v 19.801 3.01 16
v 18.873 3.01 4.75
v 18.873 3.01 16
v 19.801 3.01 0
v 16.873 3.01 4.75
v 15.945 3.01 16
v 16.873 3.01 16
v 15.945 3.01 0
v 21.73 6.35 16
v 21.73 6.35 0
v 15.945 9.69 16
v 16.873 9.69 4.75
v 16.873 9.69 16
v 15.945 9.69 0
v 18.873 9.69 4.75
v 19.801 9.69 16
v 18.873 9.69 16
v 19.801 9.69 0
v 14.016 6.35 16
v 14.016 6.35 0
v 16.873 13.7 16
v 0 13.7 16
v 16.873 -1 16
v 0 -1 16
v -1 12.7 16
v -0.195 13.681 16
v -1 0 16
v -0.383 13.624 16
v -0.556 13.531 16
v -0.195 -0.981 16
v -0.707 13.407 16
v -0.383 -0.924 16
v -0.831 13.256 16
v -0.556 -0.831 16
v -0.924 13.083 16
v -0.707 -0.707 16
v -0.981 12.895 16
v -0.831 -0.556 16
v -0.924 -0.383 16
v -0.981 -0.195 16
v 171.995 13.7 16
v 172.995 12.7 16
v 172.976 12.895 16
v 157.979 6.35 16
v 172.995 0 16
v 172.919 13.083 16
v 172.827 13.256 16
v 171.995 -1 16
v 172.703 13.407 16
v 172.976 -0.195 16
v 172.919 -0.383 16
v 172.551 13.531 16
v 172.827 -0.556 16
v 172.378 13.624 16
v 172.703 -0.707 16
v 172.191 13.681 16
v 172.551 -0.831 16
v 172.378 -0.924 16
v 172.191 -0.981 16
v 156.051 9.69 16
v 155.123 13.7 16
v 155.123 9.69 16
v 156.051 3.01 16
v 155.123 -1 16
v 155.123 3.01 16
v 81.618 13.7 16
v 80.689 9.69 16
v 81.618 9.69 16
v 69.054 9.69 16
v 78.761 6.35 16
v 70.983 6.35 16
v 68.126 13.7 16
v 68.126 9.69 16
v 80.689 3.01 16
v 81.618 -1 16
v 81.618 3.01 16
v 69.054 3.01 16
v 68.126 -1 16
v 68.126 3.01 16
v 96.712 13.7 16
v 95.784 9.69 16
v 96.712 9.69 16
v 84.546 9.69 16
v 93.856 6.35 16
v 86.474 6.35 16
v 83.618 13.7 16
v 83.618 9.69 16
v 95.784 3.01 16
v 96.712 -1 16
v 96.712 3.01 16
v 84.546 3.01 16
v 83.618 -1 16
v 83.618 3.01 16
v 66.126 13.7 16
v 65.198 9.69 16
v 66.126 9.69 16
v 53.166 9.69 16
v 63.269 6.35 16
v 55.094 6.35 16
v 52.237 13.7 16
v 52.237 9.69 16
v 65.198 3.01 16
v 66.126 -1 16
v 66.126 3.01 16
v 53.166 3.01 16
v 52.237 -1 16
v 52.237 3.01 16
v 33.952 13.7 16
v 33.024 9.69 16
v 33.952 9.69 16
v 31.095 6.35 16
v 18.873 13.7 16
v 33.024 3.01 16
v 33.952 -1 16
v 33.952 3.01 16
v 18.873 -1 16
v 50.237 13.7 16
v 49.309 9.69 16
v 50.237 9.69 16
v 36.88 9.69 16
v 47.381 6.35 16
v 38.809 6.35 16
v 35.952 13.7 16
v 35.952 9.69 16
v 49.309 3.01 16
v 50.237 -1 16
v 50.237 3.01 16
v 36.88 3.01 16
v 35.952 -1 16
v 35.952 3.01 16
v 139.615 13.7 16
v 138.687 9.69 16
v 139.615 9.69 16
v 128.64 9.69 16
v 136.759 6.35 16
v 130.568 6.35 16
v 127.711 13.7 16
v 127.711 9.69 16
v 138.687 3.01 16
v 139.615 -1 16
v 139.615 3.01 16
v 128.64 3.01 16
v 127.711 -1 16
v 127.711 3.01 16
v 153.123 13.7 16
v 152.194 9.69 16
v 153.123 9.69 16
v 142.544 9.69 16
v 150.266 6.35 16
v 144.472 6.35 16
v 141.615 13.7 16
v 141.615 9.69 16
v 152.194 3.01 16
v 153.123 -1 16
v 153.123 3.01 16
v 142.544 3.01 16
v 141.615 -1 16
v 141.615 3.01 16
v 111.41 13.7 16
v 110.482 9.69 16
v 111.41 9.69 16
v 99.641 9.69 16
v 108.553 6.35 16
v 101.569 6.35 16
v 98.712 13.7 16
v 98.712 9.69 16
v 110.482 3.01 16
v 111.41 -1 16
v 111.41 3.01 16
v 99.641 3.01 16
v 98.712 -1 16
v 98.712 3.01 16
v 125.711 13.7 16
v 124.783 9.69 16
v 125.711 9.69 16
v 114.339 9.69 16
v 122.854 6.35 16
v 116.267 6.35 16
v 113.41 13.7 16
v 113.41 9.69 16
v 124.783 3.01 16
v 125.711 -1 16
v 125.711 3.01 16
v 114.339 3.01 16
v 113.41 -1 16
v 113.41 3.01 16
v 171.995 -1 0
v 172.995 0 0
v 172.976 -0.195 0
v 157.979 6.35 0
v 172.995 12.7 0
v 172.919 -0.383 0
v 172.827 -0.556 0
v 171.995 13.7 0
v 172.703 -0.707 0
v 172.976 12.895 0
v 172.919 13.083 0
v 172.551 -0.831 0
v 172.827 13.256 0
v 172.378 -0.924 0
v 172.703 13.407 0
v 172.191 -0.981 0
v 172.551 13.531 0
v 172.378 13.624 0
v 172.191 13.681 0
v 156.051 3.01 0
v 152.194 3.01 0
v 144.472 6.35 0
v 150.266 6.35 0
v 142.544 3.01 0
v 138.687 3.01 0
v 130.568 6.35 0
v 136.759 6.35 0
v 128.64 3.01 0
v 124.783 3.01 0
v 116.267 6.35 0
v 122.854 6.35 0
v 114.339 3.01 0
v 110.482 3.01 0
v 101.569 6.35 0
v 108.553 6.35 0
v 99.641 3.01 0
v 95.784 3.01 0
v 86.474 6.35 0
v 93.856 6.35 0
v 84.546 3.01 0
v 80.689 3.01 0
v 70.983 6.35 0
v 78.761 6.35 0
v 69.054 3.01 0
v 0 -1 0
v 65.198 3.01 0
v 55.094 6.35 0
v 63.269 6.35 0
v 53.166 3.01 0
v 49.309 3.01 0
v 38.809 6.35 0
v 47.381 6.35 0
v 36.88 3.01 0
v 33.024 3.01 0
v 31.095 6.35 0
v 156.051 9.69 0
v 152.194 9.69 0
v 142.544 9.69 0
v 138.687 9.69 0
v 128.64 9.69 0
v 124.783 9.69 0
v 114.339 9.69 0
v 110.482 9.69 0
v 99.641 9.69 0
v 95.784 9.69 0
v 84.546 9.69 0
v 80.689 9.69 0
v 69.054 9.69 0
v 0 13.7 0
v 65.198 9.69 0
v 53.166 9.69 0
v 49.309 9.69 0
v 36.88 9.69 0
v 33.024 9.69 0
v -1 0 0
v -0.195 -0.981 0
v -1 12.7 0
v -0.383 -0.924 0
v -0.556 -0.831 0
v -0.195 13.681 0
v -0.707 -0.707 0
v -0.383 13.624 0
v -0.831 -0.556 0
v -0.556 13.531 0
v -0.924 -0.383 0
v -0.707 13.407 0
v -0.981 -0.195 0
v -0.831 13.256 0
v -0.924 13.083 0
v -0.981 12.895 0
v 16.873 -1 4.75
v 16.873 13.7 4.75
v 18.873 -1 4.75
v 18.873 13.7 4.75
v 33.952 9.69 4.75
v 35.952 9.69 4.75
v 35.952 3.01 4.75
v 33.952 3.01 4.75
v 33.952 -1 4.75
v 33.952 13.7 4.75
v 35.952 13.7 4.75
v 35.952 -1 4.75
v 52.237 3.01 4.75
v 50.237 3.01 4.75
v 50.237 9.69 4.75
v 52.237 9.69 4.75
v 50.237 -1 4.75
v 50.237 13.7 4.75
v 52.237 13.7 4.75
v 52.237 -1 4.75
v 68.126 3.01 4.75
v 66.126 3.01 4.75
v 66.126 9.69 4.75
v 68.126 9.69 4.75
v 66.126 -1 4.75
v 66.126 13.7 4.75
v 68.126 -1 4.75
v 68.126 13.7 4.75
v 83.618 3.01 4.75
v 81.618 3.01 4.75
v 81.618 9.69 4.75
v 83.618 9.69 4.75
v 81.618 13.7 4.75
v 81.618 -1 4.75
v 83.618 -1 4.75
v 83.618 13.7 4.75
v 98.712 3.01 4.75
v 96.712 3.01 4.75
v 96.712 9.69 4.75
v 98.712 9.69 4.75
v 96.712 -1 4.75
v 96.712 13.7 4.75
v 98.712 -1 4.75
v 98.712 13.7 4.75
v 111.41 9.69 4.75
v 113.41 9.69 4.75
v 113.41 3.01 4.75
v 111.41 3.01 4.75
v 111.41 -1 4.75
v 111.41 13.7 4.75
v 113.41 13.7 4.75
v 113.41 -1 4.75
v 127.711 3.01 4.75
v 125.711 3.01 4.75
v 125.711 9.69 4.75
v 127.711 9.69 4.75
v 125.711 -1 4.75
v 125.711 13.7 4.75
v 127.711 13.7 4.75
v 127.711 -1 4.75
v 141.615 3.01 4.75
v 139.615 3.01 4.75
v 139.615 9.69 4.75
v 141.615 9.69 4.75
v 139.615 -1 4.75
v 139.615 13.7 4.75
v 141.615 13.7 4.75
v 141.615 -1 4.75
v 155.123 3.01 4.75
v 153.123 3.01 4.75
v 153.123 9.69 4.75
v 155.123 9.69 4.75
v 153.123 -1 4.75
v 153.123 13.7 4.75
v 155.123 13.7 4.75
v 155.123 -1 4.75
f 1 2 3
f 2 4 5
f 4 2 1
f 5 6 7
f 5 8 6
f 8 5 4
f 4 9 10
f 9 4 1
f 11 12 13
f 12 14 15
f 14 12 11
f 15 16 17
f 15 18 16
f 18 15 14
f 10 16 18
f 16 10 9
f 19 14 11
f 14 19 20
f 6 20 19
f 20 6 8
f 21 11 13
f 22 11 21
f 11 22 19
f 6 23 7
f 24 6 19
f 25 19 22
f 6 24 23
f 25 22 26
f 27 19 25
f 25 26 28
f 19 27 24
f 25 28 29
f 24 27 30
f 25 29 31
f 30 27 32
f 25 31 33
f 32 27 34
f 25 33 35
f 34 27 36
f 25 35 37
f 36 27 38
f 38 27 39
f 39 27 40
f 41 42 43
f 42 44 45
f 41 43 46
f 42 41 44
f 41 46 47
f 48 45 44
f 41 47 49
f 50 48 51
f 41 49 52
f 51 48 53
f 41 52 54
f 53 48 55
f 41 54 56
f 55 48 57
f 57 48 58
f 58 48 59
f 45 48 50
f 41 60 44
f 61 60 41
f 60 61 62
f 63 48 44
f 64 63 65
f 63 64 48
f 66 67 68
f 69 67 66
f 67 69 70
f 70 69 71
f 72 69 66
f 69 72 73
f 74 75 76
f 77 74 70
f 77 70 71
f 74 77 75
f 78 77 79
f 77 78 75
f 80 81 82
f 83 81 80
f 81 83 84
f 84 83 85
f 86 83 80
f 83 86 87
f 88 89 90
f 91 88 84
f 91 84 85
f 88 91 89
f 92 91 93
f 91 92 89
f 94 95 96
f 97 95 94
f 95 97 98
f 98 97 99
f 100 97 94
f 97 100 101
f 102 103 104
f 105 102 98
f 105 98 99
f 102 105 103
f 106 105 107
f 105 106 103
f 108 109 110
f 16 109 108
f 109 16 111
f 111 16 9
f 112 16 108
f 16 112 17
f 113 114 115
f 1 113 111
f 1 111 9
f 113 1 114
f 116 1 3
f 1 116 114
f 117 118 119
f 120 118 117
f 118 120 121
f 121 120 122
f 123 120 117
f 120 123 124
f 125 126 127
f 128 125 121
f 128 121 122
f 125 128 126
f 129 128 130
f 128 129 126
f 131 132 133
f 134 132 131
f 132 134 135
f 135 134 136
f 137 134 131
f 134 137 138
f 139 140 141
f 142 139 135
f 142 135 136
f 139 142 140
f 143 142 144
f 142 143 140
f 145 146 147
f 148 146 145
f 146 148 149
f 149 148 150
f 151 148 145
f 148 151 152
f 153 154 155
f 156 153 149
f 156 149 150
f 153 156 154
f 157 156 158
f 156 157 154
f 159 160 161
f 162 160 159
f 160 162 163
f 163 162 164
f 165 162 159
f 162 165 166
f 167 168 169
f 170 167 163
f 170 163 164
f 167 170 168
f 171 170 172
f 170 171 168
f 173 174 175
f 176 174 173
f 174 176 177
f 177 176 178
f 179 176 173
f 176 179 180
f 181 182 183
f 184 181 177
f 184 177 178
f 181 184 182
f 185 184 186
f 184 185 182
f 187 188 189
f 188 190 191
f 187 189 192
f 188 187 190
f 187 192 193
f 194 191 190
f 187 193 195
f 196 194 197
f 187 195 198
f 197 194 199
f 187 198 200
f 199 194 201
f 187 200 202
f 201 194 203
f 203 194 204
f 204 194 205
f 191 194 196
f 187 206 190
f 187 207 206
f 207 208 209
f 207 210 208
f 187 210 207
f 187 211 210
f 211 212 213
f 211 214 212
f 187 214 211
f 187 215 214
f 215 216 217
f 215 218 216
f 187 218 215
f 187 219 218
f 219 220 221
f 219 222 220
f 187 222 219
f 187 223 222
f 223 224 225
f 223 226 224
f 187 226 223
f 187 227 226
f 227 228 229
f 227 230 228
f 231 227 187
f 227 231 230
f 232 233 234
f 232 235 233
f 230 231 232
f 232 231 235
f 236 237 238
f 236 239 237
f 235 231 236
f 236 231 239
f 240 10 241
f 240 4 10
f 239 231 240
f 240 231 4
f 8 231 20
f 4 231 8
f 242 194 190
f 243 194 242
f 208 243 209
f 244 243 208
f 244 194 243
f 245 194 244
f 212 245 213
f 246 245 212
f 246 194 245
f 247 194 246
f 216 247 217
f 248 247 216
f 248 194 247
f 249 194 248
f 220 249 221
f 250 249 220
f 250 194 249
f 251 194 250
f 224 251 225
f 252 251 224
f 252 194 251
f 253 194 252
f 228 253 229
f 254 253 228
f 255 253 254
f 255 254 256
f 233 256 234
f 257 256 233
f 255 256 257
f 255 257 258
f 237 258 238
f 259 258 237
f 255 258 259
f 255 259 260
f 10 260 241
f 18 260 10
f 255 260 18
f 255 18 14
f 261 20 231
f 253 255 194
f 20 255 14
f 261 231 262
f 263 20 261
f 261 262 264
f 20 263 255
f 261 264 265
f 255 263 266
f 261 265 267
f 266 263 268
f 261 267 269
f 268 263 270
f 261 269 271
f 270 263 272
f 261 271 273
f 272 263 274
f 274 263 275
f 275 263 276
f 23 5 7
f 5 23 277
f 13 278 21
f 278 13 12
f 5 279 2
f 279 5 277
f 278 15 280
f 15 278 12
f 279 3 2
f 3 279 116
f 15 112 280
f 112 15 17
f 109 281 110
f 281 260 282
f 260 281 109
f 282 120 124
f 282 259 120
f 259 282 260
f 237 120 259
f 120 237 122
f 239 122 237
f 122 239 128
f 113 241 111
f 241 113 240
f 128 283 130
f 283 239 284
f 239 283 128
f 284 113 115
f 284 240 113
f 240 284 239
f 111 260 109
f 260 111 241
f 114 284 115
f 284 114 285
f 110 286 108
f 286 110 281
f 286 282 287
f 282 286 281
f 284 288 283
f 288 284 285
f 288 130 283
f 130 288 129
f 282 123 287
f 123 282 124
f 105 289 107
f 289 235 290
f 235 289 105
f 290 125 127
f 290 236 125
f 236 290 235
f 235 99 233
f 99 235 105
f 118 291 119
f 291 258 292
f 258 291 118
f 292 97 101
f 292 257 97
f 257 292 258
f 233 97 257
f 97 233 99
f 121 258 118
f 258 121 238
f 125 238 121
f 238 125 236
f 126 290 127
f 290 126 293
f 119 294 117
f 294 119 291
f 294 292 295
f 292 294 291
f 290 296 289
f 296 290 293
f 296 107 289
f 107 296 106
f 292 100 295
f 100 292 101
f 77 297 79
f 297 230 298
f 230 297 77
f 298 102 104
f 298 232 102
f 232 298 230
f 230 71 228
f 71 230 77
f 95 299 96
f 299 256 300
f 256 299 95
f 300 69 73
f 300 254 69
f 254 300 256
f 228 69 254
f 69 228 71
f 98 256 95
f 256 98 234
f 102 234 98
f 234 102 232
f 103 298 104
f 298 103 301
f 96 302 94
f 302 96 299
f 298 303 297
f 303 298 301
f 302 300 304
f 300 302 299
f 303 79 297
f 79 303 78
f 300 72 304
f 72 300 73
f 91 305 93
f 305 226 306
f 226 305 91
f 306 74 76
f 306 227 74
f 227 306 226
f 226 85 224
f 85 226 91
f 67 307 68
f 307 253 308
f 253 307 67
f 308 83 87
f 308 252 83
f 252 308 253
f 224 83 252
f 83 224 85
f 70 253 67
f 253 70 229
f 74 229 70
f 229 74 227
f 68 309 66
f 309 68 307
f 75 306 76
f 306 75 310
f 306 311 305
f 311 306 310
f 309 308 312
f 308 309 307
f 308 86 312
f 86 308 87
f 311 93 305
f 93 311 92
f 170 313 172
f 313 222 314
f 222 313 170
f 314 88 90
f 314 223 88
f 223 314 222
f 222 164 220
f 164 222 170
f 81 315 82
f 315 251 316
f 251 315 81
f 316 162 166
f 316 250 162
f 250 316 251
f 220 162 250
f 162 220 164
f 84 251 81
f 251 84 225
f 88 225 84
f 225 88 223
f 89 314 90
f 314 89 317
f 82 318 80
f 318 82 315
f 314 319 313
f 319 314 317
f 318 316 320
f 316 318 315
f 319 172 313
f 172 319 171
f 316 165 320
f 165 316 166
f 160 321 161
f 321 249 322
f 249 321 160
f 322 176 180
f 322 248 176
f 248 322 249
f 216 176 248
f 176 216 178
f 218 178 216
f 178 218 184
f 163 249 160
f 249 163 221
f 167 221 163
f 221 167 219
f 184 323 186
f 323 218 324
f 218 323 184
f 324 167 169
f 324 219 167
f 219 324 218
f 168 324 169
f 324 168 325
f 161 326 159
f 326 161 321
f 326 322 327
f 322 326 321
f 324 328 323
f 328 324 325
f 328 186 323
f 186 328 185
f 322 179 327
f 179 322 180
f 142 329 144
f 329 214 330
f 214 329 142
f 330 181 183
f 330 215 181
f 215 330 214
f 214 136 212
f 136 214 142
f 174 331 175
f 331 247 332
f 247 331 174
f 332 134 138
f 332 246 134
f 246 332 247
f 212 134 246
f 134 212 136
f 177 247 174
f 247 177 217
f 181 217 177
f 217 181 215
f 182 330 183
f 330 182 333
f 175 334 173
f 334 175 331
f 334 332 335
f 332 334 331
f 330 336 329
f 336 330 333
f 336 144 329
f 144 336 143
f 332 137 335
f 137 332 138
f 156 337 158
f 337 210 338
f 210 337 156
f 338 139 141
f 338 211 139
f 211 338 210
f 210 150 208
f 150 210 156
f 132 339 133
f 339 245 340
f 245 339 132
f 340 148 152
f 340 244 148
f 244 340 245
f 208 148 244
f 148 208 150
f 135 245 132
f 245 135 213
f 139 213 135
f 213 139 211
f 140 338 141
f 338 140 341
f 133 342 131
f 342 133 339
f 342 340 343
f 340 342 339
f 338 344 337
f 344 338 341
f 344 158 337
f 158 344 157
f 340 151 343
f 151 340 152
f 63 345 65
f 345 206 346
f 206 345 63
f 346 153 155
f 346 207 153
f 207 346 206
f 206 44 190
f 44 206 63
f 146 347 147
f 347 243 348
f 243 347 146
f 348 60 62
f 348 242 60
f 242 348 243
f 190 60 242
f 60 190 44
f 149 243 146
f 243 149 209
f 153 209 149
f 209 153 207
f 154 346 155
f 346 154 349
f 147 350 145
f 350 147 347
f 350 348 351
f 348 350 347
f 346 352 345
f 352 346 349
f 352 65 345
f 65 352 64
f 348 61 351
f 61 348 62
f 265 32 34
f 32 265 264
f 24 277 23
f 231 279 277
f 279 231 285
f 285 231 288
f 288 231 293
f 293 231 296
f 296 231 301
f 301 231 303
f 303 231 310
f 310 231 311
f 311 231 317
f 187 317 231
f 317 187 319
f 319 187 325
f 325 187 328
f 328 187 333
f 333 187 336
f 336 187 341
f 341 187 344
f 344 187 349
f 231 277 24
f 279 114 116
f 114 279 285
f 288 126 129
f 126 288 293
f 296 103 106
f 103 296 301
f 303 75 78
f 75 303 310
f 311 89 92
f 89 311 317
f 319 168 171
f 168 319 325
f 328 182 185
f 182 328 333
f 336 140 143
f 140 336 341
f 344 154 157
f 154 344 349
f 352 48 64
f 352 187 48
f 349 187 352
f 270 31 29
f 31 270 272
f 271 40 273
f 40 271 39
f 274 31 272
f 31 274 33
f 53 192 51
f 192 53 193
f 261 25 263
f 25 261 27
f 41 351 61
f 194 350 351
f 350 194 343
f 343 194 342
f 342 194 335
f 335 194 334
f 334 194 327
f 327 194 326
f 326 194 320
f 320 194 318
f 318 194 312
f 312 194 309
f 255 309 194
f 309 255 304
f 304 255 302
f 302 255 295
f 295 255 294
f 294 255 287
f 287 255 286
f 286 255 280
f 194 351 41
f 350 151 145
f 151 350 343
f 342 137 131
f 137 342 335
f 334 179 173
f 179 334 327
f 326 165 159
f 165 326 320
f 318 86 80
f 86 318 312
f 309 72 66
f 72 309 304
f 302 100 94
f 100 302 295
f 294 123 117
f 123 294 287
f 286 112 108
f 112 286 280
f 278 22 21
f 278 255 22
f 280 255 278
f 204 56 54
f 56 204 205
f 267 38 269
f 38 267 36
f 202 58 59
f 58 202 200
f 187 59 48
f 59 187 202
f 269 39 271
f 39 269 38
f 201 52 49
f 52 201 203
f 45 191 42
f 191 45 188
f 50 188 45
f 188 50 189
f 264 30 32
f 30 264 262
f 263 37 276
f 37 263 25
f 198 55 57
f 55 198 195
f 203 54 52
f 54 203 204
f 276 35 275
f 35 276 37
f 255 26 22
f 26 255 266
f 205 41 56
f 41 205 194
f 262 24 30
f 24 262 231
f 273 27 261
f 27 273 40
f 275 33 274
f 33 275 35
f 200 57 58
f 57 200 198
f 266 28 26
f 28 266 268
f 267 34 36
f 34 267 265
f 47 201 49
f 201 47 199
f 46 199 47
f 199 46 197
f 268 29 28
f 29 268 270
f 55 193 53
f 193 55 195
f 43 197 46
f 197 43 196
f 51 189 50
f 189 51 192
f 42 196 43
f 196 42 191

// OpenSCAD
/*
* Variable Spacing Customizable Hex Bit Holder
* by Wesley T. Honeycutt
* http://wesleythoneycutt.com
* Remixed from Customisable hex bit holder by Mykhaylo Lytvynyuk
* License changed to include derivatives so I could publish.
* Inherits CC-BY-NC-SA 3.0 license from original
*
* Version history:
*    v1 - Feb. 19, 2018
*      Summary of changes:
*      Initial publication.  This file allows the user to make
*      custom hex bit holders for parts with variable tool
*      radii.  While the hex bit size stays the same, some 
*      tools such as hex sockets have variable widths depending
*      on the size of the socket.  This design incorporates a
*      recursive function which calculates a new spacing for 
*      each individual part, such that there is enough room
*      on the holder to include all of the parts.  This design
*      currently only works in 1 dimension for the purpose of 
*      spacing the parts.  It cannot, at this time, create 
*      multiple rows of parts like the original.
*/

/**
	Customisable hex bit holder 
	Copyring Mykhaylo Lytvynyuk March 2015
	http://mobilemodding.info
	Released under 
	Attribution - Non-Commercial - No Derivatives License

	*** March 16, 2015 Initial Version
*/
 	
// Hex Socket sizes (in mm)
// This must be an array [brackets,and,commas] of widths.
_sizes = [
  12.7000,
  11.1125,
   9.5250,
   8.7313,
   7.9375,
   7.1438,
   6.3500,
   5.5563,
   4.7625,
   3.9688
   ];

// Wall thickness of socket
// This is extra padding for the thickness of the socket material.
// For example, if the socket says it is 1/2", the width of the
// tool is 1/2" + some metal thickness.
_sock = 2;
 					
// mm, base height
_height = 15; //default 15

// mm, printer tolerance, can be negative, required to compensate specific printer contraction/expansion during print.
_tolerance = 0.33;

//mm, between sides and bit
_extraPadding = 2;

// Rounded corners
_rounded = 1;//[1:Yes,0:No]

// Determines if hole goes compeltely through the base
_holeThrough = 1;	//[1:Yes,0:No]	

// Make slot to add flex to the walls
_slotted = 1;//[1:Yes,0:No]

// mm, defines bit size ( 6.35 is 1/4" )
_bitSize = 6.35;

/* [Hidden] */
// local vars
outerRadius = outRadius(_bitSize + _tolerance/2,6);
delta = outerRadius + _extraPadding;
minkowskiCylinderHeight = 1;
// calculates total length of object
eachLength = [ for (i = [0:(len(_sizes)-1)]) (((_sizes[i])/2) + _sock + delta )];  
function sumv(v,i,s=0) = (i==s ? v[i] : v[i] + sumv(v,i-1,s));
totalLength = (sumv(eachLength,(len(eachLength)-1),0)) + max(eachLength);
depth = max(_sizes);
width = (outerRadius + _extraPadding);

module assembly() {

difference() {
	base();
    for(i = [0:(len(_sizes)-1)]) {
        if(i == 0) {
            translate([(eachLength[i]),(max(_sizes)/2),_holeThrough?0:1]) hexBit();
            if(_slotted){
                translate([(eachLength[i])+1,-2,minkowskiCylinderHeight + _height - _height * 0.75]) rotate([0,0,90]) cube([width + 8,2,_height*0.75],center=false);
            }
        }
        else {
            translate([(eachLength[i]+sumv(eachLength,i-1,0)),(max(_sizes)/2),_holeThrough?0:1]) hexBit();
            if(_slotted){
                translate([(eachLength[i]+sumv(eachLength,i-1,0))+1,-2,minkowskiCylinderHeight + _height - _height * 0.75]) rotate([0,0,90]) cube([width + 8,2,_height*0.75],center=false);
		}
        }
    }
}

}

module hexBit() {
	cylinder(h=_height+minkowskiCylinderHeight,r=outRadius(_bitSize/2 + _tolerance/2,6),$fn=6, center = false);
}

module base() {
	minkowski() {
		cube([totalLength,depth,_height]);
		if(_rounded) cylinder(r=1,h=minkowskiCylinderHeight,$fn=32,center = false);
	}
}

// calculates outradious by given inradius
function outRadius(inradius, sides) = inradius / ( cos (180 / sides));

assembly();
